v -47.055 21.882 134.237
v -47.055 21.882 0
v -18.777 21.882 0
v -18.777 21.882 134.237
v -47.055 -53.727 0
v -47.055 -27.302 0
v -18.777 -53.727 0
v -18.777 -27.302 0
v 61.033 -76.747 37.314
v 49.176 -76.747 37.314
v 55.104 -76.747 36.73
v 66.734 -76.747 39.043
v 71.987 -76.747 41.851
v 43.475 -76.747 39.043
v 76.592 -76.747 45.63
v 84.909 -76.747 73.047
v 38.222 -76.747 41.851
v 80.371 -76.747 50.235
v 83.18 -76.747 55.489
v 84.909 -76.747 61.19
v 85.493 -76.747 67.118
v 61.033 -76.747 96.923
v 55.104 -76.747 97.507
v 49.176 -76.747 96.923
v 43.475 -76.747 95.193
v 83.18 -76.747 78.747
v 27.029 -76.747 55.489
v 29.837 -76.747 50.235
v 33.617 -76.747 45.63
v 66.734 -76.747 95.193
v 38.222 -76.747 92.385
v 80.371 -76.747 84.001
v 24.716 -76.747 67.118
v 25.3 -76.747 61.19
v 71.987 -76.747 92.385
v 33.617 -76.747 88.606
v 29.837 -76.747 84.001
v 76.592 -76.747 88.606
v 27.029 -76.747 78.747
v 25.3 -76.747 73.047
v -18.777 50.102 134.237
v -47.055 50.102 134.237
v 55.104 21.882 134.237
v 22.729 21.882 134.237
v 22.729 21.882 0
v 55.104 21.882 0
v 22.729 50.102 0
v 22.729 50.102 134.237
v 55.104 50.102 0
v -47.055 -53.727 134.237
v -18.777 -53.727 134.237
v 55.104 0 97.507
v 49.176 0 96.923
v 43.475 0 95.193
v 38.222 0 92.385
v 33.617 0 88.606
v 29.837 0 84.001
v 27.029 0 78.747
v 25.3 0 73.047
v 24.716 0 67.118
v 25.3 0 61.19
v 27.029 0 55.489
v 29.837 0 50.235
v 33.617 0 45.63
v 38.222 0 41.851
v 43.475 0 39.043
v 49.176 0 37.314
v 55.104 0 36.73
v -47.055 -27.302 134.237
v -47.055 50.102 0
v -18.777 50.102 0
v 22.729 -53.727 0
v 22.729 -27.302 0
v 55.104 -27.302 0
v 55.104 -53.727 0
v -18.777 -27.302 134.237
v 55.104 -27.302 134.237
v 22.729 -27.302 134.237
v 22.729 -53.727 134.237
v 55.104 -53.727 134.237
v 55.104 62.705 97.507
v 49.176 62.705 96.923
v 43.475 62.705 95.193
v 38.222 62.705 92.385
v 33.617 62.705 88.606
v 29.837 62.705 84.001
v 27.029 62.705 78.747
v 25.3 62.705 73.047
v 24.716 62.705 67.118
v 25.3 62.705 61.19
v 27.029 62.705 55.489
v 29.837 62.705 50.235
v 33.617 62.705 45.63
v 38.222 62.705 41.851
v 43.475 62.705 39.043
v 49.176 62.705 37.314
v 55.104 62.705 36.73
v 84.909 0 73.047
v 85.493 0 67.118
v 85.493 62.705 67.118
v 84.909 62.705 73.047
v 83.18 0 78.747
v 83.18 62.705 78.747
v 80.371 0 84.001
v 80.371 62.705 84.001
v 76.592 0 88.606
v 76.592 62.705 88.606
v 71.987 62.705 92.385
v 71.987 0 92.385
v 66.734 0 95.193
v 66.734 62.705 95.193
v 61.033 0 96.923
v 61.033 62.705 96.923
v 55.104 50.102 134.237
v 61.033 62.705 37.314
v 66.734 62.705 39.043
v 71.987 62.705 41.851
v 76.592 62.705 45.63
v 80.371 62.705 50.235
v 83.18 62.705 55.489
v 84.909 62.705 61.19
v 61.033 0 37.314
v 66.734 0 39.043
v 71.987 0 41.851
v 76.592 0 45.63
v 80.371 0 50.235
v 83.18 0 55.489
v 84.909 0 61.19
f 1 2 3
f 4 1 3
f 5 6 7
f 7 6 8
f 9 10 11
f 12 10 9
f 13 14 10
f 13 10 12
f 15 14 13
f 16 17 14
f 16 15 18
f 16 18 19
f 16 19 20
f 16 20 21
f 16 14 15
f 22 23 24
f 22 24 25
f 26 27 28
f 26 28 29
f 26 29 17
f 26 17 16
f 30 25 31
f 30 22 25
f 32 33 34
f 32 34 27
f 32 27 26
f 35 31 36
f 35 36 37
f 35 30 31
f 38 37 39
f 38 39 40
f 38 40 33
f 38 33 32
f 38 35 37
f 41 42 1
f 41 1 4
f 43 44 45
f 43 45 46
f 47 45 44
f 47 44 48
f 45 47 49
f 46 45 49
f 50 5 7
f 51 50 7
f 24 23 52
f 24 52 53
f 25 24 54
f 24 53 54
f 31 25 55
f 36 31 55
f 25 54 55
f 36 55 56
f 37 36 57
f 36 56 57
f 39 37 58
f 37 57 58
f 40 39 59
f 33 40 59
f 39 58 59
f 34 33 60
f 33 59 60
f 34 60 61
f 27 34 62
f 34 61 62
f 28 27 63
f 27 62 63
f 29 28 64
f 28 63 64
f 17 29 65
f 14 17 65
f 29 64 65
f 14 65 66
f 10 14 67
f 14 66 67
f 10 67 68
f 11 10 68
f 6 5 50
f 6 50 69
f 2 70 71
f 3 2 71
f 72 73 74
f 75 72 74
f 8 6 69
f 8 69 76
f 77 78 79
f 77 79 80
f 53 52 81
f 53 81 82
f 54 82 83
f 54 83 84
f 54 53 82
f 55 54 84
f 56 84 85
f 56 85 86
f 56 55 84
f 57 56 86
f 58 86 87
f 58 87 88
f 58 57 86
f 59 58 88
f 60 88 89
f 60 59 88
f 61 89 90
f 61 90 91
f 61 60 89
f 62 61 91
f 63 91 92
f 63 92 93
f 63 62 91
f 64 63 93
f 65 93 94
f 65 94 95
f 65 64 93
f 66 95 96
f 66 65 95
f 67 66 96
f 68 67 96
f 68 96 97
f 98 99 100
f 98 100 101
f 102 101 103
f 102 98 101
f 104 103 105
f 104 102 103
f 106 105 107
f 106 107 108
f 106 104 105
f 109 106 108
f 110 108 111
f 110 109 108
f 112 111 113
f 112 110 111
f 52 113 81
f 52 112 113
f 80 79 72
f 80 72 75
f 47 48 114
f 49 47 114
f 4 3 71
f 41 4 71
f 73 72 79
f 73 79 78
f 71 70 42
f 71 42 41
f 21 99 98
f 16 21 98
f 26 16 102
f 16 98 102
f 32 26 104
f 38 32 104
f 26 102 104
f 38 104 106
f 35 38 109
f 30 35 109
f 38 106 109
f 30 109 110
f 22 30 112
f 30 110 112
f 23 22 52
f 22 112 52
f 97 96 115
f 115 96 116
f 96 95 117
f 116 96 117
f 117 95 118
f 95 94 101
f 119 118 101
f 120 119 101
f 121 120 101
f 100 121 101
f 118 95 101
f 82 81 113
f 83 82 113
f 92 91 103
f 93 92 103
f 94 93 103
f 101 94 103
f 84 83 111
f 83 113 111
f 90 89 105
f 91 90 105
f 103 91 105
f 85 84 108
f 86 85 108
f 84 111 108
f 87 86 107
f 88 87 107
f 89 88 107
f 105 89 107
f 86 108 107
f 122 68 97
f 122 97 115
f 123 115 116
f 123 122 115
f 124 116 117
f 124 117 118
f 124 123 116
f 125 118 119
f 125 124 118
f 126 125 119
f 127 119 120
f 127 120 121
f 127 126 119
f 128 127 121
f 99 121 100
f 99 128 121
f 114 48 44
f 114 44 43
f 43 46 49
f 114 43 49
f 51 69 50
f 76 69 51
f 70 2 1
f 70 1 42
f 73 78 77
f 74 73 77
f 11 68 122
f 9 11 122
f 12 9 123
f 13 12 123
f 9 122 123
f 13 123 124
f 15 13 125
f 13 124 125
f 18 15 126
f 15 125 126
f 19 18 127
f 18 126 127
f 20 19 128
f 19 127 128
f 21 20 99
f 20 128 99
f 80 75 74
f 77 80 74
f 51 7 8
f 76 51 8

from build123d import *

# Parameters (mm, degrees)
F0_W          = 28.278099373
F0_H          = 28.2205780968
F1_DEPTH      = 134.2365369201
F0_W_2        = 32.3758274317
F0_H_2        = 26.4255460352
F3_DEPTH      = 62.7054031938
F3_DEPTH_BACK = 76.7472609878


with BuildPart() as f1:
    # F0 (on Top) → F1 (new body)
    with BuildSketch(Plane.XY):
        with Locations((-32.9155987129, 35.9918554313)):
            Rectangle(F0_W, F0_H)
    extrude(amount=F1_DEPTH)


with BuildPart() as f1b:
    # F0 (on Top) → F1, piece 2 (new body)
    with BuildSketch(Plane.XY):
        with Locations((38.9165617526, 35.9918554313)):
            Rectangle(F0_W_2, F0_H)
    extrude(amount=F1_DEPTH)


with BuildPart() as f1c:
    # F0 (on Top) → F1, piece 3 (new body)
    with BuildSketch(Plane.XY):
        with Locations((38.9165617526, -40.5146302655)):
            Rectangle(F0_W_2, F0_H_2)
    extrude(amount=F1_DEPTH)


with BuildPart() as f1d:
    # F0 (on Top) → F1, piece 4 (new body)
    with BuildSketch(Plane.XY):
        with Locations((-32.9155987129, -40.5146302655)):
            Rectangle(F0_W, F0_H_2)
    extrude(amount=F1_DEPTH)


with BuildPart() as f3:
    # F2 (on Front) → F3 (new body, two sides)
    with BuildSketch(Plane.XZ) as f3_sk:
        with BuildLine():
            ThreePointArc((85.4928173756, 67.11826846), (76.5922781, 88.6060710916), (55.1044754684, 97.5066103673))
            Line((55.1044754684, 97.5066103673), (55.1044754684, 36.7299265528))
            ThreePointArc((55.1044754684, 36.7299265528), (76.5922781, 45.6304658284), (85.4928173756, 67.11826846))
        make_face()
        with BuildLine():
            Line((55.1044754684, 36.7299265528), (55.1044754684, 97.5066103673))
            ThreePointArc((55.1044754684, 97.5066103673), (24.7161335612, 67.11826846), (55.1044754684, 36.7299265528))
        make_face()
    extrude(amount=-F3_DEPTH)
    extrude(f3_sk.sketch, amount=F3_DEPTH_BACK)


solid = Compound([f1.part, f1b.part, f1c.part, f1d.part, f3.part])
